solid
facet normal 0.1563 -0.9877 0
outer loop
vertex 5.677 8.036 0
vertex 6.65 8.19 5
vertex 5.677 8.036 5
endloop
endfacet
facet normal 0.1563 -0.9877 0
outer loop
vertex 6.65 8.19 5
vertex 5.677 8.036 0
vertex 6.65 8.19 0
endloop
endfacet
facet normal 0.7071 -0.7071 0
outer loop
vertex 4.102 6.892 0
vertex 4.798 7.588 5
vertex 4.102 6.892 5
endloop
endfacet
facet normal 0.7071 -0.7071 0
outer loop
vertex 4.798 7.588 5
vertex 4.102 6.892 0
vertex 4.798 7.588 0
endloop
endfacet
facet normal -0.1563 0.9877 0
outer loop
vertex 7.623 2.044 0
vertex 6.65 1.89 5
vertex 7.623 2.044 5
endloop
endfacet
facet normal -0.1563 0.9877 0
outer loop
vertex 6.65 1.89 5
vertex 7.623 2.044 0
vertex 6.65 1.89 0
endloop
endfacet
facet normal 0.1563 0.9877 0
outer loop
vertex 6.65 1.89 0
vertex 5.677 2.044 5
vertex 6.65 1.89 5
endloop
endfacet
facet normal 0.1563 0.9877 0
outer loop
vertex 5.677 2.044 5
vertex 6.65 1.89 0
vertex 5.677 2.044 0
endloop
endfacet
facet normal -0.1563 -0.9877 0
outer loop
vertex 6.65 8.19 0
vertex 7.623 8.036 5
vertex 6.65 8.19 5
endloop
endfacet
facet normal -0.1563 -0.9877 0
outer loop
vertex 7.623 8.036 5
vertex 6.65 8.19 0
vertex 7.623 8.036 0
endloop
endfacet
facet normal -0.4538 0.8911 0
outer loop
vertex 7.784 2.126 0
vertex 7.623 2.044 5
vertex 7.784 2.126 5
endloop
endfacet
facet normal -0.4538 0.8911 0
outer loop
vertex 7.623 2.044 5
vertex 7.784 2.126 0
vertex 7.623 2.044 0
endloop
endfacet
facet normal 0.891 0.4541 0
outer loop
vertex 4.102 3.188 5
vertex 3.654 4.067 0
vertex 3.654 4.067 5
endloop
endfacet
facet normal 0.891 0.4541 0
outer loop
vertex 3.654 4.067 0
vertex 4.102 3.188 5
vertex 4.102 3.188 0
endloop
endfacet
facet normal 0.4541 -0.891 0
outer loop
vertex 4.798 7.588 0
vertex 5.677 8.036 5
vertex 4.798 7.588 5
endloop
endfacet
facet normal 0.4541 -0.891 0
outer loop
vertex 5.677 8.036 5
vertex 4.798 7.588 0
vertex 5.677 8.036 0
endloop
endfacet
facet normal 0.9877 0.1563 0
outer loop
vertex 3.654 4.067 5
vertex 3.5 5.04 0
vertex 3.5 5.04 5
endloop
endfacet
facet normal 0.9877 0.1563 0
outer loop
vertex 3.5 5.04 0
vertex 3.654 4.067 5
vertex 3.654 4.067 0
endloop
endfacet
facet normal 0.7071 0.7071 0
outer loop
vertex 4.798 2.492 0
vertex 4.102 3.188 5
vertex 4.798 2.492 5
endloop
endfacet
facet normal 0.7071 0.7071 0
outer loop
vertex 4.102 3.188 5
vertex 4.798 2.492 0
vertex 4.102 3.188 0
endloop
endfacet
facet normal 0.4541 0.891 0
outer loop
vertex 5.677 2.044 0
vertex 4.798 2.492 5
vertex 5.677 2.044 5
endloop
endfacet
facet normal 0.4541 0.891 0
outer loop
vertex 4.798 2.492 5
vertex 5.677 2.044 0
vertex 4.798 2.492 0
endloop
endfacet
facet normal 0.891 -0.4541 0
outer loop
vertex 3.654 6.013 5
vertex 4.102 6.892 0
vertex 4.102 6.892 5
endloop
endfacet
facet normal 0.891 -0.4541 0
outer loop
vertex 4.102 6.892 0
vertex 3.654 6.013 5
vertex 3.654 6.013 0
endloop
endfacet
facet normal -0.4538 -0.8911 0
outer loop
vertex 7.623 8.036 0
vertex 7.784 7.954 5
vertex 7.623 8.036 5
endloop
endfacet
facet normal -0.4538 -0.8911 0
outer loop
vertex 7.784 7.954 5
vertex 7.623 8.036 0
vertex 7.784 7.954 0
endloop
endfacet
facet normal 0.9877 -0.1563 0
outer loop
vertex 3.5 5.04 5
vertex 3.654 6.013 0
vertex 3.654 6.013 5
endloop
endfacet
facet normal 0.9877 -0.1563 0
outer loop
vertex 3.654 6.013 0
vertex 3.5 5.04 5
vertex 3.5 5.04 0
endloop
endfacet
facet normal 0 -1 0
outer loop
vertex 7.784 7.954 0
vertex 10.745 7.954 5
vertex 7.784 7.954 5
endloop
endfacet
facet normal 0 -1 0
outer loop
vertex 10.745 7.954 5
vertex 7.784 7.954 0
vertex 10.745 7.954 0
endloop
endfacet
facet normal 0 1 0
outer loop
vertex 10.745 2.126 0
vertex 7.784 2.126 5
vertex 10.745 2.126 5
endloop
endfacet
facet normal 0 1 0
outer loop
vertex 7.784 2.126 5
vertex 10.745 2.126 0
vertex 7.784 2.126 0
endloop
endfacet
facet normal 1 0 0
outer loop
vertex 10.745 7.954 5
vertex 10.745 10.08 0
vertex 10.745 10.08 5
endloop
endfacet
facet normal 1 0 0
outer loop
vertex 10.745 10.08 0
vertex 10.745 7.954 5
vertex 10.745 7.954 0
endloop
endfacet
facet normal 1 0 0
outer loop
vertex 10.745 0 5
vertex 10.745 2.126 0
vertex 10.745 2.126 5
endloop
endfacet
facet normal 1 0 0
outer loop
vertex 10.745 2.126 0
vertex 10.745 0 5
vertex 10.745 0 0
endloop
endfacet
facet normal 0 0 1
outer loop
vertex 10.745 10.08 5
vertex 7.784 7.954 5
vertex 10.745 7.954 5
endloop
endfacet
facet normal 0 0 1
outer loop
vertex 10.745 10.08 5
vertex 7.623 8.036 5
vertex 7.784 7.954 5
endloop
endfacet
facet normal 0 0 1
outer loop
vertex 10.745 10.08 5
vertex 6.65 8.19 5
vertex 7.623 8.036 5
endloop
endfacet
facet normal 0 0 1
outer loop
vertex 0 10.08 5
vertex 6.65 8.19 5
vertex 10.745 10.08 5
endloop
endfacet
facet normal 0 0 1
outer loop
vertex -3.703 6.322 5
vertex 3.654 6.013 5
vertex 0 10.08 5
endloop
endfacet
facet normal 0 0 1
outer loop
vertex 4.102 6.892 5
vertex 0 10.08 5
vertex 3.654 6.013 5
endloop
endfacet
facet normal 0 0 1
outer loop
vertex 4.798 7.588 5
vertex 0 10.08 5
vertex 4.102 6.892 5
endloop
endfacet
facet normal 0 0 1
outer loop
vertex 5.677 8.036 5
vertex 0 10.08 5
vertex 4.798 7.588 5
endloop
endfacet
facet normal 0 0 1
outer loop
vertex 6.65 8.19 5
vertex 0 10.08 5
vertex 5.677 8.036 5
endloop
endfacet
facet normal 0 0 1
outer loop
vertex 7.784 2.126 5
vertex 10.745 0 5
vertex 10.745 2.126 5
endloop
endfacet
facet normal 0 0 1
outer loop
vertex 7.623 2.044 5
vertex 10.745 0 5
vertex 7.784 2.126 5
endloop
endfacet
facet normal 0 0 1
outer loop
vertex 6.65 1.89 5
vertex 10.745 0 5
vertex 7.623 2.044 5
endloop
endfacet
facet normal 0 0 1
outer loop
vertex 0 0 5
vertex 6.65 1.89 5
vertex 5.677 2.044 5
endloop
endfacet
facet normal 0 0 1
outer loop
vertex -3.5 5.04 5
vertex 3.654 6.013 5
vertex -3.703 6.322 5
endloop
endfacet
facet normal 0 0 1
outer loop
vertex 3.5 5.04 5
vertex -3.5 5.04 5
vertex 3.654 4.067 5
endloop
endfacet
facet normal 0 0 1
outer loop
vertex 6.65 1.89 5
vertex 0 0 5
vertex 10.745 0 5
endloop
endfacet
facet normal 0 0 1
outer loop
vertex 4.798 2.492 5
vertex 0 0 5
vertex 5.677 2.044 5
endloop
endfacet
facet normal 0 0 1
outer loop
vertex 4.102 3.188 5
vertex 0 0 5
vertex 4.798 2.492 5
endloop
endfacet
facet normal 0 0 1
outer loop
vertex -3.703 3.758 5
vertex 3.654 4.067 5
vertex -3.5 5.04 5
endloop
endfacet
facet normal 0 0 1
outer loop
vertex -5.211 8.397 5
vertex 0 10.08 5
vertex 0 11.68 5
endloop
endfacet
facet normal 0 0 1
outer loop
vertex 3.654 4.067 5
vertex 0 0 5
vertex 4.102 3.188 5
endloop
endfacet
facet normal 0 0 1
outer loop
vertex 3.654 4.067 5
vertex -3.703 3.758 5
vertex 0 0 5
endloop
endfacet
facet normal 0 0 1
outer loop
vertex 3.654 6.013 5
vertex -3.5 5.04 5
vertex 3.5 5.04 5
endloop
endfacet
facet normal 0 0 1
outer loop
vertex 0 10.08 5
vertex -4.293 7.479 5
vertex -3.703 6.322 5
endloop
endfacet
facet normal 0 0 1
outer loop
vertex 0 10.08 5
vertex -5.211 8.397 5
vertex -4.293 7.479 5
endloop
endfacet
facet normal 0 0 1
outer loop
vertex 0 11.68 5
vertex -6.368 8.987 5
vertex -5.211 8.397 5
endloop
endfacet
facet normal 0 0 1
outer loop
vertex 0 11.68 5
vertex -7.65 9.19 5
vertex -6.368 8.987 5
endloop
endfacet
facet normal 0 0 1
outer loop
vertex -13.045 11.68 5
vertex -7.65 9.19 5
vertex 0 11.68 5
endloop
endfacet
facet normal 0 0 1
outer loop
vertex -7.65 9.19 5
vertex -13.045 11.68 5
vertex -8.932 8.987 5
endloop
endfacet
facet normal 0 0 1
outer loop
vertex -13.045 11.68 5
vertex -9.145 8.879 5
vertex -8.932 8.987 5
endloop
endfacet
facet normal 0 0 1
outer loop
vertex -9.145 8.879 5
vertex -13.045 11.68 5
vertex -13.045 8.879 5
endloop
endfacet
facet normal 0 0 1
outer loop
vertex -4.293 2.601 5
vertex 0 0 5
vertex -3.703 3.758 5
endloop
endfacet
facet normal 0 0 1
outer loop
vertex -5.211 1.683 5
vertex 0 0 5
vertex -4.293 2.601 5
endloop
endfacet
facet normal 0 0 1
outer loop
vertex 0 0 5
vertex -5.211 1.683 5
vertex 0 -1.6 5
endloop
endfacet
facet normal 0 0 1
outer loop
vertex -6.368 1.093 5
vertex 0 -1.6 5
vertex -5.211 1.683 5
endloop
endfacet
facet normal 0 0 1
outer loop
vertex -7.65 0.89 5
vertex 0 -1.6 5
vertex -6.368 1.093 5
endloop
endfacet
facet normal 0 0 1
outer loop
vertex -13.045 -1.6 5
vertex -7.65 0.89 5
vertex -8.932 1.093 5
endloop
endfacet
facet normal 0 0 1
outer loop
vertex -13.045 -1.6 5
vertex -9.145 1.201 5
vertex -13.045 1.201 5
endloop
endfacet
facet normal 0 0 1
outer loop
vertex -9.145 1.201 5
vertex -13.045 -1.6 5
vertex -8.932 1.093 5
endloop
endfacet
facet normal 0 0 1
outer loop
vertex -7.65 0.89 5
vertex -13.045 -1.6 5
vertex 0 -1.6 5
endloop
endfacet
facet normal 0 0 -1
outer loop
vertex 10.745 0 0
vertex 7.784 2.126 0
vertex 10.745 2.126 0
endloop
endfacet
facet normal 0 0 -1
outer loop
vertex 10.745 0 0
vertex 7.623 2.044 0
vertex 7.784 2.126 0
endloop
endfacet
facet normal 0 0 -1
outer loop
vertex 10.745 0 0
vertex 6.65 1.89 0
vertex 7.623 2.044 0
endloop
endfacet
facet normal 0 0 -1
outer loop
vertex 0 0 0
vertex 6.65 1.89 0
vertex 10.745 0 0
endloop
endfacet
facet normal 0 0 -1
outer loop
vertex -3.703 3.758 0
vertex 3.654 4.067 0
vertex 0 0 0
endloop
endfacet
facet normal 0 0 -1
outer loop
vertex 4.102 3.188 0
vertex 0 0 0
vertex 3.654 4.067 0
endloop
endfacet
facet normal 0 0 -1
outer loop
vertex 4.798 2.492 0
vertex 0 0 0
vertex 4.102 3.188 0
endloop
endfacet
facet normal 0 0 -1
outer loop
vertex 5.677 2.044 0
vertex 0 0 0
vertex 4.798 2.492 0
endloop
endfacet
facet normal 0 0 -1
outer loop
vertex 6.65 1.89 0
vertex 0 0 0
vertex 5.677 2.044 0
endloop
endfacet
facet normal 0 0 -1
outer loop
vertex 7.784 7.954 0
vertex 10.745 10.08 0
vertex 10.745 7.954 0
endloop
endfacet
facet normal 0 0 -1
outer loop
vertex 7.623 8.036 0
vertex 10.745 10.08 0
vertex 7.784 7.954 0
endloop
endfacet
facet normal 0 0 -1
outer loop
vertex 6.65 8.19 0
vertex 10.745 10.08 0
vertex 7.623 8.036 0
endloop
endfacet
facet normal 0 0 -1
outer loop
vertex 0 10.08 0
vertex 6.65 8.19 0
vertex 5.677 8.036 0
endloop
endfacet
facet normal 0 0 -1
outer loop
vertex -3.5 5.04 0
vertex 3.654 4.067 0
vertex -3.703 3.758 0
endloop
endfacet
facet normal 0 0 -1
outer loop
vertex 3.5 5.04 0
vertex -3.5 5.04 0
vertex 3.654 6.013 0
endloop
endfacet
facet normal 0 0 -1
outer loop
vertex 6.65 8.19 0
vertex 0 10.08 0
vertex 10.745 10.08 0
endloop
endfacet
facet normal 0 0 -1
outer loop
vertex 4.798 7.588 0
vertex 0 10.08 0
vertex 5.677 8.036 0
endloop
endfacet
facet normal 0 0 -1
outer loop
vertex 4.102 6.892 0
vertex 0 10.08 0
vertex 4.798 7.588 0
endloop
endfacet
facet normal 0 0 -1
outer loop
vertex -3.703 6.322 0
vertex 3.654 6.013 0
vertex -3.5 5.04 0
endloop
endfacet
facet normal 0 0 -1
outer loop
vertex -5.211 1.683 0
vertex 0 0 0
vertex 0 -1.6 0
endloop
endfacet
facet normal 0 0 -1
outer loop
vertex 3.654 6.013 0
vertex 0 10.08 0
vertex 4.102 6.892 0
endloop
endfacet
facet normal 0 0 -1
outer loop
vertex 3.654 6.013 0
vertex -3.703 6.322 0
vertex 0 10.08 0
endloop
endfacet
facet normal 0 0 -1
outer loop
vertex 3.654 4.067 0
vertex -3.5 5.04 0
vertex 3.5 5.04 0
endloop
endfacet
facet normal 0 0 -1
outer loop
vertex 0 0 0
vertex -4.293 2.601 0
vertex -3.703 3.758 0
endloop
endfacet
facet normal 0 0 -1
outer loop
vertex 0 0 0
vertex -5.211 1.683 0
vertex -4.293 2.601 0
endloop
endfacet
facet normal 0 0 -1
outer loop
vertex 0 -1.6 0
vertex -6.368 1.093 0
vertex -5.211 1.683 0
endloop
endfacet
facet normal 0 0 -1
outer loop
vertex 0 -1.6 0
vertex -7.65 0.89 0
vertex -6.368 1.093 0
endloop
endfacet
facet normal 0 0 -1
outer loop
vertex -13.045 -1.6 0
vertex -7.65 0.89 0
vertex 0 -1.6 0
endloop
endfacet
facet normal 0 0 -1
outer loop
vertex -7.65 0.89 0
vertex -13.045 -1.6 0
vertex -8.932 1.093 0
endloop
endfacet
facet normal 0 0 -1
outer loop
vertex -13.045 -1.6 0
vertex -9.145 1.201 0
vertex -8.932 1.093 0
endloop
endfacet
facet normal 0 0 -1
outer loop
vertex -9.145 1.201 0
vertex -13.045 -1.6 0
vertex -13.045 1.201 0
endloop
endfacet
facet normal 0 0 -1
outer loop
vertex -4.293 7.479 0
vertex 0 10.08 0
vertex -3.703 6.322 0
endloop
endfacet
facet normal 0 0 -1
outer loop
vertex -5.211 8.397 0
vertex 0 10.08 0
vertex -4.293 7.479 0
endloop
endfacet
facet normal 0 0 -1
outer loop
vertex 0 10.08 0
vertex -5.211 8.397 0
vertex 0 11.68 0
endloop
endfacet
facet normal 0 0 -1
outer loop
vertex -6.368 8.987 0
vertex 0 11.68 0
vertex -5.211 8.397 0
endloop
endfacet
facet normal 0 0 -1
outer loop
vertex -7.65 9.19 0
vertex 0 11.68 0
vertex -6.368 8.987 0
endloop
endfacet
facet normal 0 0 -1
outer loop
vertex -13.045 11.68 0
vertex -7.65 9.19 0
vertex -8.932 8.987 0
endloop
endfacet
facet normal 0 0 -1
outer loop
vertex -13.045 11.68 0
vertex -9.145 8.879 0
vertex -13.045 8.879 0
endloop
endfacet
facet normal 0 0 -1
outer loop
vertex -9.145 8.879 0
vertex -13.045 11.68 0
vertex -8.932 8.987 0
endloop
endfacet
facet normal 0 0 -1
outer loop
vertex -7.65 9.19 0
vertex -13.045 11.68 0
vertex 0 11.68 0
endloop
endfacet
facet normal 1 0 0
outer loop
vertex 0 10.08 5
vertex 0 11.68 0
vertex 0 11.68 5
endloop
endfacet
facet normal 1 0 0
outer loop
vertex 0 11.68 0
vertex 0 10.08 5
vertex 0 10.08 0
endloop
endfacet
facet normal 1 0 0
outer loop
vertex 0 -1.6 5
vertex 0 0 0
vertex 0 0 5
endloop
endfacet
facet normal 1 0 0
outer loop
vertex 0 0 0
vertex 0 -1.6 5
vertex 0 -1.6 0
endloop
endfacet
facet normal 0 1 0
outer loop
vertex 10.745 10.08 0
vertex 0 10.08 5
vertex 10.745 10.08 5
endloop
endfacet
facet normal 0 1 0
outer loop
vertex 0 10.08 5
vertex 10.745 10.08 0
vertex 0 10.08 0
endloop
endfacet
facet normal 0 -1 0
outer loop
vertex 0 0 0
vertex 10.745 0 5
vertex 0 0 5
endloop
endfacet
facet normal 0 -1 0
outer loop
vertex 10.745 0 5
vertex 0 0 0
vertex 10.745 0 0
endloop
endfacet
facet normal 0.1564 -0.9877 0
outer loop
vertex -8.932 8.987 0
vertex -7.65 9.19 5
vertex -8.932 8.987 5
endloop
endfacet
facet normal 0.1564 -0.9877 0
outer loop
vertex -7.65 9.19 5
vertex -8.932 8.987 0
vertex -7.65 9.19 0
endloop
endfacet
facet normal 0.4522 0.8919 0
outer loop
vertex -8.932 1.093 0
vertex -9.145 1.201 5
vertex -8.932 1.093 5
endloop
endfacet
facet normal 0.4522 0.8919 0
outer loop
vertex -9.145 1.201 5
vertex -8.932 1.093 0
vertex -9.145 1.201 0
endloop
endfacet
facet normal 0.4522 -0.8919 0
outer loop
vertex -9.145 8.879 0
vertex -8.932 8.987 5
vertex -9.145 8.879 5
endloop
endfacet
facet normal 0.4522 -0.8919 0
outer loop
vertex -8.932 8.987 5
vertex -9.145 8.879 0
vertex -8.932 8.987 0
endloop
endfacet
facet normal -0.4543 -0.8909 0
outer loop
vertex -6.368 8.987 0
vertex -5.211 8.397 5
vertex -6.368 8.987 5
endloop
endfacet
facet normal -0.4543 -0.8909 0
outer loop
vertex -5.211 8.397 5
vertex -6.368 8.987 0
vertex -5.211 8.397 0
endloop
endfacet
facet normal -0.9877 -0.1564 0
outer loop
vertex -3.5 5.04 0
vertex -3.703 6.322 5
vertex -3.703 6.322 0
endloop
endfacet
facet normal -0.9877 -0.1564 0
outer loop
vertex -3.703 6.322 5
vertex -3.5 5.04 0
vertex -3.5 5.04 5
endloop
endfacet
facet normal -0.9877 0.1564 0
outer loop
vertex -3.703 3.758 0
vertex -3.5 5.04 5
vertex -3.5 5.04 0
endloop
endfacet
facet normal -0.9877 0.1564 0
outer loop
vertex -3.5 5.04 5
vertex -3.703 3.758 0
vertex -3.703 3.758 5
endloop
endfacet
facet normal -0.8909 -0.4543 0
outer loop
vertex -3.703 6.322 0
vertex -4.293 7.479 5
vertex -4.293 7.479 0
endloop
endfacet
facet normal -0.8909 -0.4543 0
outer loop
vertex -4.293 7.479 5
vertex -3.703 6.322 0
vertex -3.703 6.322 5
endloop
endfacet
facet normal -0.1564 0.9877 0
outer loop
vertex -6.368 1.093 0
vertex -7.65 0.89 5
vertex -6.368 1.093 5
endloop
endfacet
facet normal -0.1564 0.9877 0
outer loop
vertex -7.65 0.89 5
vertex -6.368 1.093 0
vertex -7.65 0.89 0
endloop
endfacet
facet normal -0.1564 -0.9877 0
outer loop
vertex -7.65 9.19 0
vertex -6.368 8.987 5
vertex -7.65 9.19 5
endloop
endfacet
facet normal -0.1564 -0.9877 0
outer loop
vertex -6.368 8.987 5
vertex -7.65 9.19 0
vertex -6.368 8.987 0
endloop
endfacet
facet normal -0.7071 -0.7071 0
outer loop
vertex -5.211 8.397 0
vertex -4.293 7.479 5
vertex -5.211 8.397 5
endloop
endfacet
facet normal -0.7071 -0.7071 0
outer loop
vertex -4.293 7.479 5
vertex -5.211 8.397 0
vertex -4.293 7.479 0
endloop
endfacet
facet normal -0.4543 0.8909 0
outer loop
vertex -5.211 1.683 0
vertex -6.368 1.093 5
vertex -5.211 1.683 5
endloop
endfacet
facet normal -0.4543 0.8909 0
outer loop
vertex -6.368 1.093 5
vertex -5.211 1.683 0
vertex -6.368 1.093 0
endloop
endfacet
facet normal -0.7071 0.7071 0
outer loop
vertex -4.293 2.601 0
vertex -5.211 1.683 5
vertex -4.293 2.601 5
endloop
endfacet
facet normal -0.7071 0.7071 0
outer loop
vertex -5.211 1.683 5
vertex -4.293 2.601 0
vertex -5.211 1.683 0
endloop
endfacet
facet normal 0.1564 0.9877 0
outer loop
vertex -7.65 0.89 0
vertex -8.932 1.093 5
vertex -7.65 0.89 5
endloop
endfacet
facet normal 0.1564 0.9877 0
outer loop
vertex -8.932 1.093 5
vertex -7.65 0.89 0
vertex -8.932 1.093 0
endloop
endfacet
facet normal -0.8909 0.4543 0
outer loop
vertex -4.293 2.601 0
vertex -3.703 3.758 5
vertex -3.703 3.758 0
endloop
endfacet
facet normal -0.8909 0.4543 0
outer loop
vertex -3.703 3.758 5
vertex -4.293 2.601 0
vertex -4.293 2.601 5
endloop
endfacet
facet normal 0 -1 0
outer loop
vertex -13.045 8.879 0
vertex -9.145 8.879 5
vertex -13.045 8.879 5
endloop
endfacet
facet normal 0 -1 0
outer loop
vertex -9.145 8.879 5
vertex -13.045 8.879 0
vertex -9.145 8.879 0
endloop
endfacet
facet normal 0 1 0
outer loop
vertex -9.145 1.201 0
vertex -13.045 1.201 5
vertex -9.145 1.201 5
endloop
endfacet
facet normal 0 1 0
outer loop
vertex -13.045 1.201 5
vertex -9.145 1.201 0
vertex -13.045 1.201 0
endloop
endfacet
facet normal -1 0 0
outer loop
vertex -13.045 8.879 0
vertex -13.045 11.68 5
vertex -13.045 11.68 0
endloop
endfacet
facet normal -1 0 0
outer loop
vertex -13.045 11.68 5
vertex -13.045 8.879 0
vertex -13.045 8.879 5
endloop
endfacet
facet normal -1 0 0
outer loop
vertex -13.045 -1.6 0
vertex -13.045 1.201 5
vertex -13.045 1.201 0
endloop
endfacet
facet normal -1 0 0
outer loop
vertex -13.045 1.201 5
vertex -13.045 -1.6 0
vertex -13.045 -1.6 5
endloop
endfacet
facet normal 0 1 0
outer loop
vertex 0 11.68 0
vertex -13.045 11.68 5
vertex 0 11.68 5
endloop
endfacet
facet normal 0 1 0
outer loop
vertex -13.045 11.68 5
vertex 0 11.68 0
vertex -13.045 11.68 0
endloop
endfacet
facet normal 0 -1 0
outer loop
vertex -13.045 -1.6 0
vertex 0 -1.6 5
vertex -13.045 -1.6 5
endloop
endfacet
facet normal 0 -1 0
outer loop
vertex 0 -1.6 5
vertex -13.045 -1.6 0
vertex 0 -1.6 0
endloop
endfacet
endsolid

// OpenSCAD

// diameter of the first or smaller chord
diameter1 = 6;

// diameter of the second or larger chord
diameter2 = 8;

// spacing between the 2 chords
offsetVal = 7;

// Thickness of part
thickness = 5;

// Thickness of bending snap fit
clampthickness = 3.2;

// Tightness of fit
fitVal = 3; // [1,2,3,4,5,6,7,8,9,10]

// adds an tolerance for over-sizing
OversizeTolerance = 0.3;

tightness = 2-(fitVal/20);
radius1 = (diameter1+OversizeTolerance)/2;
radius2 = (diameter2+OversizeTolerance)/2;
offset1 = offsetVal/2;

module build1(radius,offset) {
    difference() {
        cubeWidth = clampthickness*radius;
        cubeLength = offset + (2.3*radius);
        union() {
            cube([cubeLength,cubeWidth,thickness], false);
        }
        scale([1,1,2]) translate([0,0,-thickness*0.25])
        union() {
            $fn = 20;
            translate([offset+(radius),cubeWidth/2,0])
                cylinder(h = thickness, r = radius, center = false);

            translate([(offset+radius),(clampthickness-tightness)*radius/2,0])
                cube([2*radius,tightness*radius,thickness],false);
        }
    }
}

module chordLock(r1,r2,o1) {
    // this calculates the value for centering
    // the mirrored part
    alignOffset = (clampthickness*abs(r1-r2)/2);

    // this builds the first half
    build1(r1,o1);

    // this mirrors the second half
    mirror([1,0,0]) translate([0,-alignOffset,0])
    build1(r2,o1);
}

chordLock(radius1,radius2,offset1);
